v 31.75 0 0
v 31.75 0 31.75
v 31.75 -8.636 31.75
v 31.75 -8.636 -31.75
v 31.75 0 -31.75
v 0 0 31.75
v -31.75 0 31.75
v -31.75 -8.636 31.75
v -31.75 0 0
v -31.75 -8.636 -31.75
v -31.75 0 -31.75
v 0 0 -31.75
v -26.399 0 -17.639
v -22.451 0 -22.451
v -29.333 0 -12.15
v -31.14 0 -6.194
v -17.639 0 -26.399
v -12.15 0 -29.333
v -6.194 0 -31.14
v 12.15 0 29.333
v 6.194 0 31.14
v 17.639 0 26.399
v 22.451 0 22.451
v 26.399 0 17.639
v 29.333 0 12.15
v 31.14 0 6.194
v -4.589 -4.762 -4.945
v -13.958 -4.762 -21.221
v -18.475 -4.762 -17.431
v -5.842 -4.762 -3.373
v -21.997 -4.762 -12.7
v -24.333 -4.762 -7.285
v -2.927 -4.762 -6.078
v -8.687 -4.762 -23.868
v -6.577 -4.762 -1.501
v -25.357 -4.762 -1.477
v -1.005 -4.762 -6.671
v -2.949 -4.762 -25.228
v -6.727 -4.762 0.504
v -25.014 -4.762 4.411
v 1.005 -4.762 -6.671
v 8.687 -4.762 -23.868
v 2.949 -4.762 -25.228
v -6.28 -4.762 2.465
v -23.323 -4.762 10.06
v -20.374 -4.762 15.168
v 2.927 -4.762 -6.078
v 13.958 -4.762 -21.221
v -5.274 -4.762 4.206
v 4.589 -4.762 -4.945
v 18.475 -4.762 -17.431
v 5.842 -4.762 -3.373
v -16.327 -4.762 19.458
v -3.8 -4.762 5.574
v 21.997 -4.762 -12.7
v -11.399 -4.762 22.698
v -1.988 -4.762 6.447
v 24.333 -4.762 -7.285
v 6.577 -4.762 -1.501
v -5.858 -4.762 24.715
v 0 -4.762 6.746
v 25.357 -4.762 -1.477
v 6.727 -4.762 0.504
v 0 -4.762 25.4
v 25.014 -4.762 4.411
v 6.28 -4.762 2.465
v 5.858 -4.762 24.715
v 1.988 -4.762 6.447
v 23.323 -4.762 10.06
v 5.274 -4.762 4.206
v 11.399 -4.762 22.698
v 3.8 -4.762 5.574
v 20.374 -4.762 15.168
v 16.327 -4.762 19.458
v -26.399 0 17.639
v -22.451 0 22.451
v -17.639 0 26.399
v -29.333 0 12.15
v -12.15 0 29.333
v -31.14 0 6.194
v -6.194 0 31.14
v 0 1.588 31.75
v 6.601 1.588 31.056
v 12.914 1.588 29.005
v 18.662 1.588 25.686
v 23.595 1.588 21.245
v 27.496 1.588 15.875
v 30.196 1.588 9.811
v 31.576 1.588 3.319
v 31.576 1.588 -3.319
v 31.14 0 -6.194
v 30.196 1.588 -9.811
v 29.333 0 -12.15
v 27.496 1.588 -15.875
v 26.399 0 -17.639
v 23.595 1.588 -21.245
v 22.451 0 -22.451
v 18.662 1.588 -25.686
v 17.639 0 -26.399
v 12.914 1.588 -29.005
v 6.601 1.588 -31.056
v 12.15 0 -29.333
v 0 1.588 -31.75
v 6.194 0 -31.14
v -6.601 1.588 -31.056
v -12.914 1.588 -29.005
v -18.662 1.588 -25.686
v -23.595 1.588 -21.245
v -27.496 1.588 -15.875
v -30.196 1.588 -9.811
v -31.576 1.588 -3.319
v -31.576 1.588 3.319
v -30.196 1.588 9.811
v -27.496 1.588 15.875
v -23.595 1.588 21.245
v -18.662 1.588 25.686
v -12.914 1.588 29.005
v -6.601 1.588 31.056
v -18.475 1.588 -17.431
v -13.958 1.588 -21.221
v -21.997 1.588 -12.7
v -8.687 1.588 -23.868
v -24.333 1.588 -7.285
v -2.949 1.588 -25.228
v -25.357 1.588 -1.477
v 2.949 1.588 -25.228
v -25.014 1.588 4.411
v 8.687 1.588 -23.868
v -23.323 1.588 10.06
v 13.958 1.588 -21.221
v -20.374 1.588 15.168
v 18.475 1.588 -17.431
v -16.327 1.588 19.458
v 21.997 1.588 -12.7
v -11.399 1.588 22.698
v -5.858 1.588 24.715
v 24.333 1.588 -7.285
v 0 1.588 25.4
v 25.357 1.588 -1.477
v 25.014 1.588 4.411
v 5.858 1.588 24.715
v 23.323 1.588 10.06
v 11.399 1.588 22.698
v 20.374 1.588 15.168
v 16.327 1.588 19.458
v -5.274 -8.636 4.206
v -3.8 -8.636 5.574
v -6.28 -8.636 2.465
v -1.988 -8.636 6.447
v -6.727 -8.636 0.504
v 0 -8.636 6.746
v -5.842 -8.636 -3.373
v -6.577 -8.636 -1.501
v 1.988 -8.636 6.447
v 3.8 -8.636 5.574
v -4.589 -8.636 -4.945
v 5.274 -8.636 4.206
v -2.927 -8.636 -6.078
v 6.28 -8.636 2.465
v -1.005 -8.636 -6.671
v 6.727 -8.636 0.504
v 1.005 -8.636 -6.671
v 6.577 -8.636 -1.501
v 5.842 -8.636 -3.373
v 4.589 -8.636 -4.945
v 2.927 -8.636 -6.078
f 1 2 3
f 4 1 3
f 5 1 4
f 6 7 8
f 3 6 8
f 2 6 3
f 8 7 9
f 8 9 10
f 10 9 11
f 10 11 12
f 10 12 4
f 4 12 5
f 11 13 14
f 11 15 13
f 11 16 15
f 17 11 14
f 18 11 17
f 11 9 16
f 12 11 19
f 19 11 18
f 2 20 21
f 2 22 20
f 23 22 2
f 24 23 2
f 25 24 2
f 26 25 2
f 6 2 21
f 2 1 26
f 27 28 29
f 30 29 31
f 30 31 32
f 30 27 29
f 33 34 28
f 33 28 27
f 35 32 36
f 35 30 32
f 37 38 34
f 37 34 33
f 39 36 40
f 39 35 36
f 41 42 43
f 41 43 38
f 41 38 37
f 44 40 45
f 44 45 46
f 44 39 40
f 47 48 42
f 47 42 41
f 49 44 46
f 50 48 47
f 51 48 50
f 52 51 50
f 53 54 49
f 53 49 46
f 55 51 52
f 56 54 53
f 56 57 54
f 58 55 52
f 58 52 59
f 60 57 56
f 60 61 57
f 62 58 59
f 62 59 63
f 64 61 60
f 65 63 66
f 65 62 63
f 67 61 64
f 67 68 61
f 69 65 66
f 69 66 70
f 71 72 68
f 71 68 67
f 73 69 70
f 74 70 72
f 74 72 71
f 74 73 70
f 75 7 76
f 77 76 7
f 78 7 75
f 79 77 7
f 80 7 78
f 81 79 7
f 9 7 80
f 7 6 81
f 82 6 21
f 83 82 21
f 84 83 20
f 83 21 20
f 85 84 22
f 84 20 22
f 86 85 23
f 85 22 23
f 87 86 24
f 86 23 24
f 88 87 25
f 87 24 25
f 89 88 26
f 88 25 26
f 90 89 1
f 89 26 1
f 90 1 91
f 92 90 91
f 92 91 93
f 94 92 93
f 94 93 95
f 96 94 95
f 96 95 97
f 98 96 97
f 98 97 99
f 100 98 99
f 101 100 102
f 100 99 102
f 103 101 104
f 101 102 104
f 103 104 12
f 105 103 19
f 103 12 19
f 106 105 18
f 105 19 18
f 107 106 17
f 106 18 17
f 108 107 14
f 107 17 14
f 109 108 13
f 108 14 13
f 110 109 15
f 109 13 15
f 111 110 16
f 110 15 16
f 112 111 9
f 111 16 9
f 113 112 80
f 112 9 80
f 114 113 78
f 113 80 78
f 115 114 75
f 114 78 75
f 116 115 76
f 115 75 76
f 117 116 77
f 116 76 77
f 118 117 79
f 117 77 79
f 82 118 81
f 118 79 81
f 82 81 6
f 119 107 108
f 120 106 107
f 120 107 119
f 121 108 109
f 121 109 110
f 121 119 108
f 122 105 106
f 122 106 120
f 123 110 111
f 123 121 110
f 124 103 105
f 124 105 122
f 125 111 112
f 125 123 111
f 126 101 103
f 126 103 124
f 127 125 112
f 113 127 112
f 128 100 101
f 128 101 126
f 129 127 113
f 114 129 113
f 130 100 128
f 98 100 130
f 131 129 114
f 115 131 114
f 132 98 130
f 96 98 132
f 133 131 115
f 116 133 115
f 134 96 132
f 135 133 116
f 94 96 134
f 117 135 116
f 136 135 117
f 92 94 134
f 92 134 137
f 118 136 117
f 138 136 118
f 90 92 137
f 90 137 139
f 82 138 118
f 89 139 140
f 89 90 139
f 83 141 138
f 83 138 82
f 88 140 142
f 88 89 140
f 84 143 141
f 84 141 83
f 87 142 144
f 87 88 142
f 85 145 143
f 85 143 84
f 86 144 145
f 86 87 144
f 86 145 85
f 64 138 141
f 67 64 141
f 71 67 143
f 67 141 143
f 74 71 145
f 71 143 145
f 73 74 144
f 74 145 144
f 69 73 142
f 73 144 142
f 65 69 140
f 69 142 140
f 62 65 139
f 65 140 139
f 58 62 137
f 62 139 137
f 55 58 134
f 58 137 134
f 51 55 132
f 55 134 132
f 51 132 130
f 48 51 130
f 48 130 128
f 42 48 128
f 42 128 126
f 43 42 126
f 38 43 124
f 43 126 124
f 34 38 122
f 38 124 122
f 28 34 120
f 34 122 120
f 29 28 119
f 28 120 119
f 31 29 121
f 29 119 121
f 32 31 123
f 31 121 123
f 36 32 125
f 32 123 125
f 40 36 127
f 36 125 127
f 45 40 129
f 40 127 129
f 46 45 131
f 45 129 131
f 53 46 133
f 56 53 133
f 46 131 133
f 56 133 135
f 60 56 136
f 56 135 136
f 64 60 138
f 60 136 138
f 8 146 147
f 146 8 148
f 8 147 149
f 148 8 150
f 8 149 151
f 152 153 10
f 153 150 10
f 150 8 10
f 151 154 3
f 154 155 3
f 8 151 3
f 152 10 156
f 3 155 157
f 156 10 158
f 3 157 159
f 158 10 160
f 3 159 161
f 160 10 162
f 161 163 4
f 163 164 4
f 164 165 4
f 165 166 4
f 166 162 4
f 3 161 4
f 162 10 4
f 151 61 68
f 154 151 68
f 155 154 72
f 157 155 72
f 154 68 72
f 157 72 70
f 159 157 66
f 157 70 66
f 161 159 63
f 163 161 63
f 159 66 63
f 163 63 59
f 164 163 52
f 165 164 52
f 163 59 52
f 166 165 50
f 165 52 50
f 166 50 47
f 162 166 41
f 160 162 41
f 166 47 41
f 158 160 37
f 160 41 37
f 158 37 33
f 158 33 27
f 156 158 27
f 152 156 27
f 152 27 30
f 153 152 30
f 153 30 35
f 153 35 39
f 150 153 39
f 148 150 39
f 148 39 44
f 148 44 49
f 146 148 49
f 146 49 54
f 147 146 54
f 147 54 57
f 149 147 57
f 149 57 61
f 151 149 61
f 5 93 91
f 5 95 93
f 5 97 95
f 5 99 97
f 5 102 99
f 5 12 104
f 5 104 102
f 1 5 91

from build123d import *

# Parameters (mm, degrees)
SKETCH2_W           = 63.5
SKETCH2_H           = 63.5
BOSS_EXTRUDE1_DEPTH = 8.636
SKETCH3_R           = 31.75
BOSS_EXTRUDE2_DEPTH = 1.5875
SKETCH4_R           = 25.4
CUT_EXTRUDE1_DEPTH  = 6.35
SKETCH5_R           = 6.74624
CUT_EXTRUDE3_DEPTH  = 46.348070521


with BuildPart() as part:
    # Sketch2 → Boss-Extrude1 (new body)
    with BuildSketch(Plane(origin=(0, 0, 0), x_dir=(1, 0, 0), z_dir=(0, 1, 0))):
        Rectangle(SKETCH2_W, SKETCH2_H)
    extrude(amount=-BOSS_EXTRUDE1_DEPTH)

    # Sketch3 → Boss-Extrude2 (add)
    with BuildSketch(Plane(origin=(0, 0, 0), x_dir=(1, 0, 0), z_dir=(0, 1, 0))):
        with Locations(Location((0, 0, 0), (0, 0, 270))):
            Circle(SKETCH3_R)
    extrude(amount=BOSS_EXTRUDE2_DEPTH)

    # Sketch4 → Cut-Extrude1 (cut)
    with BuildSketch(Plane(origin=(0, 1.5875, 0), x_dir=(1, 0, 0), z_dir=(0, 1, 0))):
        with Locations(Location((0, 0, 0), (0, 0, 270))):
            Circle(SKETCH4_R)
    extrude(amount=-CUT_EXTRUDE1_DEPTH, mode=Mode.SUBTRACT)

    # Sketch5 → Cut-Extrude3 (cut, through all)
    with BuildSketch(Plane(origin=(0, -4.7625, 0), x_dir=(1, 0, 0), z_dir=(0, 1, 0))):
        with Locations(Location((0, 0, 0), (0, 0, 270))):
            Circle(SKETCH5_R)
    extrude(amount=-CUT_EXTRUDE3_DEPTH, mode=Mode.SUBTRACT)


solid = part.part
